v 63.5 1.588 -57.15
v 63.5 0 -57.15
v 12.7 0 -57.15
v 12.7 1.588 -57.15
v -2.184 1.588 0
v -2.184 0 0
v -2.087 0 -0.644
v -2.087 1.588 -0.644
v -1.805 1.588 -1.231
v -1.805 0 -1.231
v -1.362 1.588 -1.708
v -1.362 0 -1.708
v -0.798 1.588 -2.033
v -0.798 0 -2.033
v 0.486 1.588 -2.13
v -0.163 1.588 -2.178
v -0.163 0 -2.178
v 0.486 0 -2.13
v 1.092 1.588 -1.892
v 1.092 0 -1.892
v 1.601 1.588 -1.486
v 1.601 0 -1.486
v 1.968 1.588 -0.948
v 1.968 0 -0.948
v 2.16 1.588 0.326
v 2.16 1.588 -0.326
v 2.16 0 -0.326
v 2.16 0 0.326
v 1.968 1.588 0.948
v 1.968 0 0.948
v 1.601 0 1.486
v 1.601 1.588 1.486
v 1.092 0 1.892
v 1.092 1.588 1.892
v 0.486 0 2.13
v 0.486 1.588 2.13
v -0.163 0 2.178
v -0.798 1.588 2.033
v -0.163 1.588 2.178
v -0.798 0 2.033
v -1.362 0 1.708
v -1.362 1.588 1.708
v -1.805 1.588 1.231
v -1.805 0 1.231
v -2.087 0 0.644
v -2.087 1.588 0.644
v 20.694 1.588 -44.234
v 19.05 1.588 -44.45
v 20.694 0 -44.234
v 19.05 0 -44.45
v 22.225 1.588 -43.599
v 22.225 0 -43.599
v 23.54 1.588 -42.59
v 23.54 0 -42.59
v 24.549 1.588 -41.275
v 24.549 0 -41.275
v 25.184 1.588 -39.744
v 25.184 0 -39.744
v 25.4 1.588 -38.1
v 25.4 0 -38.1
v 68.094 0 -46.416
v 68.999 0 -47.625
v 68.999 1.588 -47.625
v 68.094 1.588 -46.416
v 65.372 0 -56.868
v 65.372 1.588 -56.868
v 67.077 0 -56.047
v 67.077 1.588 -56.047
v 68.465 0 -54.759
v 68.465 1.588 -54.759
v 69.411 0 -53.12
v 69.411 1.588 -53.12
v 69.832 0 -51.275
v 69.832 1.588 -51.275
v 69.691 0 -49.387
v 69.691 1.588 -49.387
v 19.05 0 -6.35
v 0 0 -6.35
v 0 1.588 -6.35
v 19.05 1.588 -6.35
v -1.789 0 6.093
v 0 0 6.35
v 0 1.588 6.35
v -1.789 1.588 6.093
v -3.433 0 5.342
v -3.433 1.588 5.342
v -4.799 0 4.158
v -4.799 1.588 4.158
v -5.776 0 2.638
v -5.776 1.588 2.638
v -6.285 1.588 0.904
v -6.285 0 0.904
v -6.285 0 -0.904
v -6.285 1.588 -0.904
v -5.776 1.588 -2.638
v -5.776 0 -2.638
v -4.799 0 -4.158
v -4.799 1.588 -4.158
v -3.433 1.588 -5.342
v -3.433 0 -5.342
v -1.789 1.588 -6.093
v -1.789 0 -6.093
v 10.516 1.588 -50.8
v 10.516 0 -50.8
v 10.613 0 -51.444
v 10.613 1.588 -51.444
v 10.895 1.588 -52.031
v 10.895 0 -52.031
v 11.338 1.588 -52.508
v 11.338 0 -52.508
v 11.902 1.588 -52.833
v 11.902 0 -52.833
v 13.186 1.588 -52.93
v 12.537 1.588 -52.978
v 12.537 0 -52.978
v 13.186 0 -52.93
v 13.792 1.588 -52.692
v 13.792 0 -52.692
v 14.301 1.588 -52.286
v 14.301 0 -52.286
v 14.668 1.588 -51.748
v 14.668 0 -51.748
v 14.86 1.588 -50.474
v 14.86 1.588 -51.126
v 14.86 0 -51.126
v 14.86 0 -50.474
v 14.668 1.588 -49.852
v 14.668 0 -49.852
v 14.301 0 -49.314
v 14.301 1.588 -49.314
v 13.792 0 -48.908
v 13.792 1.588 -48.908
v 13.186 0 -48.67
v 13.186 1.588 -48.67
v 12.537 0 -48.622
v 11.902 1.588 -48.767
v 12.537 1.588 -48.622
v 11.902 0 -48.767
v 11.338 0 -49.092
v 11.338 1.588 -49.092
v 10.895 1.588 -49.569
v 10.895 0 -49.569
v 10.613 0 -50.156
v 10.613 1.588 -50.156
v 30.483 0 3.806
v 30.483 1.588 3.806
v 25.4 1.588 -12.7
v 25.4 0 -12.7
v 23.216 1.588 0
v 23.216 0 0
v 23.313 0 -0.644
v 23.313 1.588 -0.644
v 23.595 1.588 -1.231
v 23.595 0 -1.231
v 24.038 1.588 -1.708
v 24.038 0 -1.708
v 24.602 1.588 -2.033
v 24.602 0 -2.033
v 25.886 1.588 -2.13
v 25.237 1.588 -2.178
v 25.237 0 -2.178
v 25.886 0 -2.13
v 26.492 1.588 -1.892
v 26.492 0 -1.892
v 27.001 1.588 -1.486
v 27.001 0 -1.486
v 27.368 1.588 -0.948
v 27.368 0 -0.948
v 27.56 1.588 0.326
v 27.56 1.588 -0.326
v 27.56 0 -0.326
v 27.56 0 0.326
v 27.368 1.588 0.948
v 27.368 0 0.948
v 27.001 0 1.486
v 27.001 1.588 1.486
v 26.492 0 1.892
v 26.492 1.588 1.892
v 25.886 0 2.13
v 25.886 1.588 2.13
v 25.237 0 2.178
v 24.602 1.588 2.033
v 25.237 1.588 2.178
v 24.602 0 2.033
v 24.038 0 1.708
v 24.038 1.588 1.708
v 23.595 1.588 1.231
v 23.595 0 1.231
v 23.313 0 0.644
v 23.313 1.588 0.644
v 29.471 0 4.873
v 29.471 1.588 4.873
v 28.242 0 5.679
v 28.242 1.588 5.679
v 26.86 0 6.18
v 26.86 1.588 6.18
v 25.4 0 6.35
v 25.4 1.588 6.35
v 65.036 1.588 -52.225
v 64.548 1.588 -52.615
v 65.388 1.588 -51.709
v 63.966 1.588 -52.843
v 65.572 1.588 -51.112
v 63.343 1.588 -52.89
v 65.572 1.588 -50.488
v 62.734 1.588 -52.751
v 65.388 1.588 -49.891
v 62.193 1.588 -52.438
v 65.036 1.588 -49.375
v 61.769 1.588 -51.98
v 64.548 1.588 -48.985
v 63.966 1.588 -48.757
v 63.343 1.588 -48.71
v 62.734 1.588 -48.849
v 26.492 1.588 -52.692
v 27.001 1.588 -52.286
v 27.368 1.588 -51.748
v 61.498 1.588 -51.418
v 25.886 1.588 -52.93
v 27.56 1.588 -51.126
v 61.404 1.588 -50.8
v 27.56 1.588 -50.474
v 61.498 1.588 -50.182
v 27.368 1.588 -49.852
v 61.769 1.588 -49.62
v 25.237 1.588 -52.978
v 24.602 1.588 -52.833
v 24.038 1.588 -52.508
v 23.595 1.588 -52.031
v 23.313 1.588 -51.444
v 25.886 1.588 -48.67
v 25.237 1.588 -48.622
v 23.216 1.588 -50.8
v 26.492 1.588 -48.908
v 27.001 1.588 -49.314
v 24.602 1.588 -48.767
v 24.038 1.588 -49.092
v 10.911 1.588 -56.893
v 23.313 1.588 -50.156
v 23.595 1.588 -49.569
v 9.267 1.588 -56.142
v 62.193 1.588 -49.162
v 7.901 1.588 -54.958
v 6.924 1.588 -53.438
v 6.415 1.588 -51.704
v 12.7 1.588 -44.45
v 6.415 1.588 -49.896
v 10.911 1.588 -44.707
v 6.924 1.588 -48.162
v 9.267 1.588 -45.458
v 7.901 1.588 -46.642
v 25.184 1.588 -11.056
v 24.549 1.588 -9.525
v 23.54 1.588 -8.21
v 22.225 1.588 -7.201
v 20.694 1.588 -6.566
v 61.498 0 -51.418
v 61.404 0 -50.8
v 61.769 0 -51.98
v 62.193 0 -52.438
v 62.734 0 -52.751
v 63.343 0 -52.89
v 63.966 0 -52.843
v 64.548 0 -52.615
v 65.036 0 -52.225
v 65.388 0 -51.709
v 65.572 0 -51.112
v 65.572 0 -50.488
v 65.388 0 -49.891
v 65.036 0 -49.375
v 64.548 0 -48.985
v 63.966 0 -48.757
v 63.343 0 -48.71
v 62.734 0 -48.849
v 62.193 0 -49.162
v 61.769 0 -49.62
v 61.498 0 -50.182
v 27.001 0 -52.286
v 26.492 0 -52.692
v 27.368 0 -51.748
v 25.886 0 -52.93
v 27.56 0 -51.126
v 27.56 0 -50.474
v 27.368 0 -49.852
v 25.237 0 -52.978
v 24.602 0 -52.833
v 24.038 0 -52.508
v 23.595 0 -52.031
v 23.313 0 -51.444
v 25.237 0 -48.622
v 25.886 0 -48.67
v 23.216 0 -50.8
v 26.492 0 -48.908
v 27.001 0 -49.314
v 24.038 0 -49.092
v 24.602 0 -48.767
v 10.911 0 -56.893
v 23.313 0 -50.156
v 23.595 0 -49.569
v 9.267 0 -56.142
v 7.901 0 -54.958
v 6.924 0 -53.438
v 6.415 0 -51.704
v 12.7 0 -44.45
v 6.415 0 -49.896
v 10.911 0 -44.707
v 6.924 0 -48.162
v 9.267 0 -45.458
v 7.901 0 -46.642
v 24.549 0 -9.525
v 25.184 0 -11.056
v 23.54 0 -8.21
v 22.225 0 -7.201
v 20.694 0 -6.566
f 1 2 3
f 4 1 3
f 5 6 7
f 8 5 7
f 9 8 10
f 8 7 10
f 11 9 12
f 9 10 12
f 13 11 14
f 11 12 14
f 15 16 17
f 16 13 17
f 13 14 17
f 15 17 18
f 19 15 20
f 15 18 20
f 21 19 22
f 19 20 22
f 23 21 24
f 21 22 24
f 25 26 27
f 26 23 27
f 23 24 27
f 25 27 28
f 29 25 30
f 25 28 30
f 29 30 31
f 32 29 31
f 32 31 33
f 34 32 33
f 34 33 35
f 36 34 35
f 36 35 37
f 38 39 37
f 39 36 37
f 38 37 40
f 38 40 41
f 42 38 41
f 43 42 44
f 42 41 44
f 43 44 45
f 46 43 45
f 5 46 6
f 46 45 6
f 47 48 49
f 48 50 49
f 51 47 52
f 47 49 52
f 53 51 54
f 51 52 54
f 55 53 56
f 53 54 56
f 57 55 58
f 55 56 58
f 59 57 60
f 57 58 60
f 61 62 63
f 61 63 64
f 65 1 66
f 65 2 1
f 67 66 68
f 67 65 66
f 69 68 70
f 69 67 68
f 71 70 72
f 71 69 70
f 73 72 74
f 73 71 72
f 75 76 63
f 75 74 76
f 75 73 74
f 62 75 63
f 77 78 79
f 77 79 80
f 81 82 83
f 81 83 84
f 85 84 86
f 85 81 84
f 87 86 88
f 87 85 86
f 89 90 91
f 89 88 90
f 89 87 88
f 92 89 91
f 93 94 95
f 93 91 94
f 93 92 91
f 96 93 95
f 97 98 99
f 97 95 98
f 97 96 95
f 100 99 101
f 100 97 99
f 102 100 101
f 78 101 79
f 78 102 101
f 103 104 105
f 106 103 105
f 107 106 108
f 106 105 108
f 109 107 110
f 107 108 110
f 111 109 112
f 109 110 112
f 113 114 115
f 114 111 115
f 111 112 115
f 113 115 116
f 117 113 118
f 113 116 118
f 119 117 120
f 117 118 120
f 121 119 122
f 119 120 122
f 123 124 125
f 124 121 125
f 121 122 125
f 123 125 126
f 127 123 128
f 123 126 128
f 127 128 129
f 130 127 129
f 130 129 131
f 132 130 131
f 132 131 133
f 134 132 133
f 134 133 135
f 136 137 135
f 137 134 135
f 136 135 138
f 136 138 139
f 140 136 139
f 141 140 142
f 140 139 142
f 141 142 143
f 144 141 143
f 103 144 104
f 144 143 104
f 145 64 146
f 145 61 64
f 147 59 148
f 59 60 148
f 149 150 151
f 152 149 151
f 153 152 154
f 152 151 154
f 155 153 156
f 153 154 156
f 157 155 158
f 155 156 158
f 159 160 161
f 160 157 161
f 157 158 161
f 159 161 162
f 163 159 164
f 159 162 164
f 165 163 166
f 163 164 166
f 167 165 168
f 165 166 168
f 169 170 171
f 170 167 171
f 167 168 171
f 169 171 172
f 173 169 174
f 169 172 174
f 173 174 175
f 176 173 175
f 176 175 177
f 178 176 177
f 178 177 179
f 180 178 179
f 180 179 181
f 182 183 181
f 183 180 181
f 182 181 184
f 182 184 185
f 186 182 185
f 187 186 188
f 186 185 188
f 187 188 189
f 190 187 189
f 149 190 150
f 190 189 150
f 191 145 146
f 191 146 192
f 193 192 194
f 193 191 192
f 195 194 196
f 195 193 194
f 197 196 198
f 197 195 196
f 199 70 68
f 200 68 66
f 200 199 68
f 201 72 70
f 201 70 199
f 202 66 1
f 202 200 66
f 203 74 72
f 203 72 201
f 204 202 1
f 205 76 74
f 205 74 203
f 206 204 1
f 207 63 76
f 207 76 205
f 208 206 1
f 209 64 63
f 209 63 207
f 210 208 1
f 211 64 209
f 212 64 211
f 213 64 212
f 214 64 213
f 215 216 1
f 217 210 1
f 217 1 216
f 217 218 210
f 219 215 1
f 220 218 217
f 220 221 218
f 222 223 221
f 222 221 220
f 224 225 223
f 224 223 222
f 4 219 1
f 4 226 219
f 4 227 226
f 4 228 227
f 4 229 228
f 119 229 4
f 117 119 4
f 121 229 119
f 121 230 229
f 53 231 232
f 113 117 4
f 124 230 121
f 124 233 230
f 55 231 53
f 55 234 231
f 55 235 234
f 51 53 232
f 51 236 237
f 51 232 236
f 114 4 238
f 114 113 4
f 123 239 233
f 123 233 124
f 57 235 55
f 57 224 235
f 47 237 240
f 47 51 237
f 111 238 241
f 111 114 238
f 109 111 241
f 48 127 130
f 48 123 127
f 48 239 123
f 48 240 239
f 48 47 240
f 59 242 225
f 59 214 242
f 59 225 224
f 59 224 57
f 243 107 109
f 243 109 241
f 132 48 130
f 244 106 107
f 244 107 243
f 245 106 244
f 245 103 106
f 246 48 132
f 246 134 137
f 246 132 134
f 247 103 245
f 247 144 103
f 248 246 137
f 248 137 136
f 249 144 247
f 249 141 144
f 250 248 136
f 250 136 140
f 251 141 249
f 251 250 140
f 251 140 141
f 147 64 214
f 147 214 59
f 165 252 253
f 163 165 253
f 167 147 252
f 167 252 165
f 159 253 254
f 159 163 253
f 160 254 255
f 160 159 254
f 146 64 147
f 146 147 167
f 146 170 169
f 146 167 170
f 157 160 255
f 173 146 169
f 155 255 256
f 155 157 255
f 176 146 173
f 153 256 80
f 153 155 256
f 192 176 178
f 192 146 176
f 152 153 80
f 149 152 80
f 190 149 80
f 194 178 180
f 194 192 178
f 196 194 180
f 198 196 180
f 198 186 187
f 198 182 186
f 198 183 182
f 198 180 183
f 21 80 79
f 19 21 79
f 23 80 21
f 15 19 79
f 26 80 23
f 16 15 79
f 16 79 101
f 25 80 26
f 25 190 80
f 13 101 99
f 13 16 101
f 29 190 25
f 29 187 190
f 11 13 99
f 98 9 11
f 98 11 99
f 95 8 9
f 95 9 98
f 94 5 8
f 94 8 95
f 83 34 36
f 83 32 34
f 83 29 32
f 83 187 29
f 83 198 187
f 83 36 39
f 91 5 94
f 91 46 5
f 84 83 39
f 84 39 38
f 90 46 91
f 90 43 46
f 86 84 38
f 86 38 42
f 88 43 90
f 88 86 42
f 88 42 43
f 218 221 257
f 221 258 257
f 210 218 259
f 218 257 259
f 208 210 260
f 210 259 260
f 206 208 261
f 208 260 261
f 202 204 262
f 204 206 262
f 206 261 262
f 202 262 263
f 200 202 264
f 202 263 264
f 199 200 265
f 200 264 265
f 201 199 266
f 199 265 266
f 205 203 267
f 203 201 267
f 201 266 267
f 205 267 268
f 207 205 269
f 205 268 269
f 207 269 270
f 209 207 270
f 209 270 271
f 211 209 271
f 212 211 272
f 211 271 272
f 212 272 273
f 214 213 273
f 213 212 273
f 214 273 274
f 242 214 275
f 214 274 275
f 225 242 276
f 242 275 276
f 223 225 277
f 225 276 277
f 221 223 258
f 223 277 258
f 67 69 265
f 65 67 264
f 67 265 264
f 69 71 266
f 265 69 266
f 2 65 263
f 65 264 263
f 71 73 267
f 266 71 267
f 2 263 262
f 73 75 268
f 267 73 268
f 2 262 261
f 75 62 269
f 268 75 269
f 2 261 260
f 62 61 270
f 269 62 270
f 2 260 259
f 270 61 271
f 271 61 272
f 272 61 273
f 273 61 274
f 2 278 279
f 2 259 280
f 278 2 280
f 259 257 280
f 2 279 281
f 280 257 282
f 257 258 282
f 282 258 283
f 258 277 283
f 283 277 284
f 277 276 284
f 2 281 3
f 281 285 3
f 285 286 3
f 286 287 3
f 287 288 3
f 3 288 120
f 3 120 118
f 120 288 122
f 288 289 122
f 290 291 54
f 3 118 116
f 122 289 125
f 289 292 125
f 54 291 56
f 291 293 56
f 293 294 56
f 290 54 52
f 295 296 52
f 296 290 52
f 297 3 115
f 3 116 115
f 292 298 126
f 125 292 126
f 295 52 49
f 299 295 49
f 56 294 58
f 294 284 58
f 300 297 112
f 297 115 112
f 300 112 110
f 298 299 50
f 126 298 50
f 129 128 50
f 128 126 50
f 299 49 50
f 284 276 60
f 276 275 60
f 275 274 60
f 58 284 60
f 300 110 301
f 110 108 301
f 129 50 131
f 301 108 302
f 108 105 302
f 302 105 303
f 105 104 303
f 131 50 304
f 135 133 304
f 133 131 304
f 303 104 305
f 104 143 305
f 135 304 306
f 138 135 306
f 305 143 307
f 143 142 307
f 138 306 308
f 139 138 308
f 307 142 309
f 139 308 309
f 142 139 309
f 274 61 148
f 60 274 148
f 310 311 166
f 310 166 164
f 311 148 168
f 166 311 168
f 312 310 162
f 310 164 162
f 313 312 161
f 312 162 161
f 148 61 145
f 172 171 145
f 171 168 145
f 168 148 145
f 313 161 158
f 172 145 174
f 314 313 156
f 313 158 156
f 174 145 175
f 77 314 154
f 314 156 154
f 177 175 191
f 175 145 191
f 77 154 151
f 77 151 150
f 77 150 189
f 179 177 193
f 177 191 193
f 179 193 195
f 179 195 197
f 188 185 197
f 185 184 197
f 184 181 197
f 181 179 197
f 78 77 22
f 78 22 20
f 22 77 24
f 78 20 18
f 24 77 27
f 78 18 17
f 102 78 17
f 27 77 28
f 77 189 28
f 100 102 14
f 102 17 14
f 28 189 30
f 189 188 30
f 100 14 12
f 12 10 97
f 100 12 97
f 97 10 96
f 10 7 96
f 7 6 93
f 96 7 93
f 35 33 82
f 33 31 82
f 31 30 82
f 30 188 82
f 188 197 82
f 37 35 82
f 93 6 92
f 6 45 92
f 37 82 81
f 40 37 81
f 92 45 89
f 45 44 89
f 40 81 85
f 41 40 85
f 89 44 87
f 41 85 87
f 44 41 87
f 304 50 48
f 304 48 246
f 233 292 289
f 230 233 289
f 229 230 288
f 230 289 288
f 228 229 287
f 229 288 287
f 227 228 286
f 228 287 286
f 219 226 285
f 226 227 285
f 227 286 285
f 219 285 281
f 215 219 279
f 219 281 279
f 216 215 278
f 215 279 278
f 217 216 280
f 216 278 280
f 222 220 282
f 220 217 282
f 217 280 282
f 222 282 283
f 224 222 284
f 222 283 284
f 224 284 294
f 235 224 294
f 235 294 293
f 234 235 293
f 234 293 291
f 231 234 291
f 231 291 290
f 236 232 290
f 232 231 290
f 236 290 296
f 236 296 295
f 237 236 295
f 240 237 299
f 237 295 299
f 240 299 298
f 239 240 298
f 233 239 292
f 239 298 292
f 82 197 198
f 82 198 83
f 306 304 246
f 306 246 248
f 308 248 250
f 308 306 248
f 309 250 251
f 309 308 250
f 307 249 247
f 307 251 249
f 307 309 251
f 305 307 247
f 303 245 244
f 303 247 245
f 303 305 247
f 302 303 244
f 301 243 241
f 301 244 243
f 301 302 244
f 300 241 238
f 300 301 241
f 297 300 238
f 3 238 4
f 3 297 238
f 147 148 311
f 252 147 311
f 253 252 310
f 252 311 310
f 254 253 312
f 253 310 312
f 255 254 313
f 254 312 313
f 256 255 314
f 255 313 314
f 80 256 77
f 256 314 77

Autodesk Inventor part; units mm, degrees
ref_plane "YZ Plane" through (0, 0, 0) normal (1, 0, 0) x (0, 1, 0)
ref_plane "XZ Plane" through (0, 0, 0) normal (0, 1, 0) x (-1, 0, 0)
ref_plane "XY Plane" through (0, 0, 0) normal (0, 0, 1) x (1, 0, 0)
sketch "main" plane through (0, 0, 0) normal (0, 0, 1) x (1, 0, 0)
  circle A0 centre (33.5416, 32.0006) radius 2.1844
  line L0 (8.1416, 38.3506) -> (33.5416, 38.3506)
  line L1 (33.5416, 25.6506) -> (14.4916, 25.6506)
  arc A1 (33.5416, 25.6506) -> (33.5416, 38.3506) centre (33.5416, 32.0006) ccw
  circle A2 centre (8.1416, 32.0006) radius 2.1844
  arc A3 (14.4916, 25.6506) -> (8.1416, 19.3006) centre (14.4916, 19.3006) ccw
  arc A4 (8.1416, 38.3506) -> (2.462, 34.8404) centre (8.1416, 32.0006) ccw
  line L2 (8.1416, -6.0994) -> (8.1416, 19.3006)
  arc A5 (8.1416, -6.0994) -> (14.4916, -12.4494) centre (14.4916, -6.0994) ccw
  circle A6 centre (8.1416, -18.7994) radius 2.1844
  line L3 (14.4916, -12.4494) -> (20.8416, -12.4494)
  line L4 (-29.9584, -25.1494) -> (20.8416, -25.1494)
  arc A7 (20.8416, -25.1494) -> (20.8416, -12.4494) centre (20.8416, -18.7994) ccw
  circle A8 centre (20.8416, -18.7994) radius 2.1844
  circle A9 centre (-29.9584, -18.7994) radius 2.0955
  arc A10 (-34.5524, -14.4156) -> (-29.9584, -25.1494) centre (-29.9584, -18.7994) ccw
  line L5 (-35.4577, -15.6244) -> (3.0589, 35.807)
  point P0 (9.5067, 8.1196)
  point P1 (8.1416, 25.6506)
  point P2 (8.1416, -12.4494)
  dimension "d0" = 6.35
  dimension "d4" = 4.191
sketch "Sketch1" plane through (0, 0, 0) normal (0, 1, 0) x (-1, 0, 0)
  circle A0 centre (0, 0) radius 2.1844
  line L0 (-25.4, 6.35) -> (0, 6.35)
  line L1 (0, -6.35) -> (-19.05, -6.35)
  arc A1 (0, -6.35) -> (0, 6.35) centre (0, 0) ccw
  circle A2 centre (-25.4, 0) radius 2.1844
  arc A3 (-19.05, -6.35) -> (-25.4, -12.7) centre (-19.05, -12.7) ccw
  arc A4 (-25.4, 6.35) -> (-31.0796, 2.8398) centre (-25.4, 0) ccw
  line L2 (-25.4, -38.1) -> (-25.4, -12.7)
  arc A5 (-25.4, -38.1) -> (-19.05, -44.45) centre (-19.05, -38.1) ccw
  circle A6 centre (-25.4, -50.8) radius 2.1844
  line L3 (-19.05, -44.45) -> (-12.7, -44.45)
  line L4 (-63.5, -57.15) -> (-12.7, -57.15)
  arc A7 (-12.7, -57.15) -> (-12.7, -44.45) centre (-12.7, -50.8) ccw
  circle A8 centre (-12.7, -50.8) radius 2.1844
  circle A9 centre (-63.5, -50.8) radius 2.0955
  arc A10 (-68.094, -46.4162) -> (-63.5, -57.15) centre (-63.5, -50.8) ccw
  line L5 (-68.9993, -47.625) -> (-30.4827, 3.8064)
extrude "Extrusion1" add sketch "Sketch1" along normal blind 1.5875 contours L0 A1 L1 A3 L2 A5 L3 A7 L4 A10 L5 A4
properties part number "gusset" material "Acetal Resin, White"
